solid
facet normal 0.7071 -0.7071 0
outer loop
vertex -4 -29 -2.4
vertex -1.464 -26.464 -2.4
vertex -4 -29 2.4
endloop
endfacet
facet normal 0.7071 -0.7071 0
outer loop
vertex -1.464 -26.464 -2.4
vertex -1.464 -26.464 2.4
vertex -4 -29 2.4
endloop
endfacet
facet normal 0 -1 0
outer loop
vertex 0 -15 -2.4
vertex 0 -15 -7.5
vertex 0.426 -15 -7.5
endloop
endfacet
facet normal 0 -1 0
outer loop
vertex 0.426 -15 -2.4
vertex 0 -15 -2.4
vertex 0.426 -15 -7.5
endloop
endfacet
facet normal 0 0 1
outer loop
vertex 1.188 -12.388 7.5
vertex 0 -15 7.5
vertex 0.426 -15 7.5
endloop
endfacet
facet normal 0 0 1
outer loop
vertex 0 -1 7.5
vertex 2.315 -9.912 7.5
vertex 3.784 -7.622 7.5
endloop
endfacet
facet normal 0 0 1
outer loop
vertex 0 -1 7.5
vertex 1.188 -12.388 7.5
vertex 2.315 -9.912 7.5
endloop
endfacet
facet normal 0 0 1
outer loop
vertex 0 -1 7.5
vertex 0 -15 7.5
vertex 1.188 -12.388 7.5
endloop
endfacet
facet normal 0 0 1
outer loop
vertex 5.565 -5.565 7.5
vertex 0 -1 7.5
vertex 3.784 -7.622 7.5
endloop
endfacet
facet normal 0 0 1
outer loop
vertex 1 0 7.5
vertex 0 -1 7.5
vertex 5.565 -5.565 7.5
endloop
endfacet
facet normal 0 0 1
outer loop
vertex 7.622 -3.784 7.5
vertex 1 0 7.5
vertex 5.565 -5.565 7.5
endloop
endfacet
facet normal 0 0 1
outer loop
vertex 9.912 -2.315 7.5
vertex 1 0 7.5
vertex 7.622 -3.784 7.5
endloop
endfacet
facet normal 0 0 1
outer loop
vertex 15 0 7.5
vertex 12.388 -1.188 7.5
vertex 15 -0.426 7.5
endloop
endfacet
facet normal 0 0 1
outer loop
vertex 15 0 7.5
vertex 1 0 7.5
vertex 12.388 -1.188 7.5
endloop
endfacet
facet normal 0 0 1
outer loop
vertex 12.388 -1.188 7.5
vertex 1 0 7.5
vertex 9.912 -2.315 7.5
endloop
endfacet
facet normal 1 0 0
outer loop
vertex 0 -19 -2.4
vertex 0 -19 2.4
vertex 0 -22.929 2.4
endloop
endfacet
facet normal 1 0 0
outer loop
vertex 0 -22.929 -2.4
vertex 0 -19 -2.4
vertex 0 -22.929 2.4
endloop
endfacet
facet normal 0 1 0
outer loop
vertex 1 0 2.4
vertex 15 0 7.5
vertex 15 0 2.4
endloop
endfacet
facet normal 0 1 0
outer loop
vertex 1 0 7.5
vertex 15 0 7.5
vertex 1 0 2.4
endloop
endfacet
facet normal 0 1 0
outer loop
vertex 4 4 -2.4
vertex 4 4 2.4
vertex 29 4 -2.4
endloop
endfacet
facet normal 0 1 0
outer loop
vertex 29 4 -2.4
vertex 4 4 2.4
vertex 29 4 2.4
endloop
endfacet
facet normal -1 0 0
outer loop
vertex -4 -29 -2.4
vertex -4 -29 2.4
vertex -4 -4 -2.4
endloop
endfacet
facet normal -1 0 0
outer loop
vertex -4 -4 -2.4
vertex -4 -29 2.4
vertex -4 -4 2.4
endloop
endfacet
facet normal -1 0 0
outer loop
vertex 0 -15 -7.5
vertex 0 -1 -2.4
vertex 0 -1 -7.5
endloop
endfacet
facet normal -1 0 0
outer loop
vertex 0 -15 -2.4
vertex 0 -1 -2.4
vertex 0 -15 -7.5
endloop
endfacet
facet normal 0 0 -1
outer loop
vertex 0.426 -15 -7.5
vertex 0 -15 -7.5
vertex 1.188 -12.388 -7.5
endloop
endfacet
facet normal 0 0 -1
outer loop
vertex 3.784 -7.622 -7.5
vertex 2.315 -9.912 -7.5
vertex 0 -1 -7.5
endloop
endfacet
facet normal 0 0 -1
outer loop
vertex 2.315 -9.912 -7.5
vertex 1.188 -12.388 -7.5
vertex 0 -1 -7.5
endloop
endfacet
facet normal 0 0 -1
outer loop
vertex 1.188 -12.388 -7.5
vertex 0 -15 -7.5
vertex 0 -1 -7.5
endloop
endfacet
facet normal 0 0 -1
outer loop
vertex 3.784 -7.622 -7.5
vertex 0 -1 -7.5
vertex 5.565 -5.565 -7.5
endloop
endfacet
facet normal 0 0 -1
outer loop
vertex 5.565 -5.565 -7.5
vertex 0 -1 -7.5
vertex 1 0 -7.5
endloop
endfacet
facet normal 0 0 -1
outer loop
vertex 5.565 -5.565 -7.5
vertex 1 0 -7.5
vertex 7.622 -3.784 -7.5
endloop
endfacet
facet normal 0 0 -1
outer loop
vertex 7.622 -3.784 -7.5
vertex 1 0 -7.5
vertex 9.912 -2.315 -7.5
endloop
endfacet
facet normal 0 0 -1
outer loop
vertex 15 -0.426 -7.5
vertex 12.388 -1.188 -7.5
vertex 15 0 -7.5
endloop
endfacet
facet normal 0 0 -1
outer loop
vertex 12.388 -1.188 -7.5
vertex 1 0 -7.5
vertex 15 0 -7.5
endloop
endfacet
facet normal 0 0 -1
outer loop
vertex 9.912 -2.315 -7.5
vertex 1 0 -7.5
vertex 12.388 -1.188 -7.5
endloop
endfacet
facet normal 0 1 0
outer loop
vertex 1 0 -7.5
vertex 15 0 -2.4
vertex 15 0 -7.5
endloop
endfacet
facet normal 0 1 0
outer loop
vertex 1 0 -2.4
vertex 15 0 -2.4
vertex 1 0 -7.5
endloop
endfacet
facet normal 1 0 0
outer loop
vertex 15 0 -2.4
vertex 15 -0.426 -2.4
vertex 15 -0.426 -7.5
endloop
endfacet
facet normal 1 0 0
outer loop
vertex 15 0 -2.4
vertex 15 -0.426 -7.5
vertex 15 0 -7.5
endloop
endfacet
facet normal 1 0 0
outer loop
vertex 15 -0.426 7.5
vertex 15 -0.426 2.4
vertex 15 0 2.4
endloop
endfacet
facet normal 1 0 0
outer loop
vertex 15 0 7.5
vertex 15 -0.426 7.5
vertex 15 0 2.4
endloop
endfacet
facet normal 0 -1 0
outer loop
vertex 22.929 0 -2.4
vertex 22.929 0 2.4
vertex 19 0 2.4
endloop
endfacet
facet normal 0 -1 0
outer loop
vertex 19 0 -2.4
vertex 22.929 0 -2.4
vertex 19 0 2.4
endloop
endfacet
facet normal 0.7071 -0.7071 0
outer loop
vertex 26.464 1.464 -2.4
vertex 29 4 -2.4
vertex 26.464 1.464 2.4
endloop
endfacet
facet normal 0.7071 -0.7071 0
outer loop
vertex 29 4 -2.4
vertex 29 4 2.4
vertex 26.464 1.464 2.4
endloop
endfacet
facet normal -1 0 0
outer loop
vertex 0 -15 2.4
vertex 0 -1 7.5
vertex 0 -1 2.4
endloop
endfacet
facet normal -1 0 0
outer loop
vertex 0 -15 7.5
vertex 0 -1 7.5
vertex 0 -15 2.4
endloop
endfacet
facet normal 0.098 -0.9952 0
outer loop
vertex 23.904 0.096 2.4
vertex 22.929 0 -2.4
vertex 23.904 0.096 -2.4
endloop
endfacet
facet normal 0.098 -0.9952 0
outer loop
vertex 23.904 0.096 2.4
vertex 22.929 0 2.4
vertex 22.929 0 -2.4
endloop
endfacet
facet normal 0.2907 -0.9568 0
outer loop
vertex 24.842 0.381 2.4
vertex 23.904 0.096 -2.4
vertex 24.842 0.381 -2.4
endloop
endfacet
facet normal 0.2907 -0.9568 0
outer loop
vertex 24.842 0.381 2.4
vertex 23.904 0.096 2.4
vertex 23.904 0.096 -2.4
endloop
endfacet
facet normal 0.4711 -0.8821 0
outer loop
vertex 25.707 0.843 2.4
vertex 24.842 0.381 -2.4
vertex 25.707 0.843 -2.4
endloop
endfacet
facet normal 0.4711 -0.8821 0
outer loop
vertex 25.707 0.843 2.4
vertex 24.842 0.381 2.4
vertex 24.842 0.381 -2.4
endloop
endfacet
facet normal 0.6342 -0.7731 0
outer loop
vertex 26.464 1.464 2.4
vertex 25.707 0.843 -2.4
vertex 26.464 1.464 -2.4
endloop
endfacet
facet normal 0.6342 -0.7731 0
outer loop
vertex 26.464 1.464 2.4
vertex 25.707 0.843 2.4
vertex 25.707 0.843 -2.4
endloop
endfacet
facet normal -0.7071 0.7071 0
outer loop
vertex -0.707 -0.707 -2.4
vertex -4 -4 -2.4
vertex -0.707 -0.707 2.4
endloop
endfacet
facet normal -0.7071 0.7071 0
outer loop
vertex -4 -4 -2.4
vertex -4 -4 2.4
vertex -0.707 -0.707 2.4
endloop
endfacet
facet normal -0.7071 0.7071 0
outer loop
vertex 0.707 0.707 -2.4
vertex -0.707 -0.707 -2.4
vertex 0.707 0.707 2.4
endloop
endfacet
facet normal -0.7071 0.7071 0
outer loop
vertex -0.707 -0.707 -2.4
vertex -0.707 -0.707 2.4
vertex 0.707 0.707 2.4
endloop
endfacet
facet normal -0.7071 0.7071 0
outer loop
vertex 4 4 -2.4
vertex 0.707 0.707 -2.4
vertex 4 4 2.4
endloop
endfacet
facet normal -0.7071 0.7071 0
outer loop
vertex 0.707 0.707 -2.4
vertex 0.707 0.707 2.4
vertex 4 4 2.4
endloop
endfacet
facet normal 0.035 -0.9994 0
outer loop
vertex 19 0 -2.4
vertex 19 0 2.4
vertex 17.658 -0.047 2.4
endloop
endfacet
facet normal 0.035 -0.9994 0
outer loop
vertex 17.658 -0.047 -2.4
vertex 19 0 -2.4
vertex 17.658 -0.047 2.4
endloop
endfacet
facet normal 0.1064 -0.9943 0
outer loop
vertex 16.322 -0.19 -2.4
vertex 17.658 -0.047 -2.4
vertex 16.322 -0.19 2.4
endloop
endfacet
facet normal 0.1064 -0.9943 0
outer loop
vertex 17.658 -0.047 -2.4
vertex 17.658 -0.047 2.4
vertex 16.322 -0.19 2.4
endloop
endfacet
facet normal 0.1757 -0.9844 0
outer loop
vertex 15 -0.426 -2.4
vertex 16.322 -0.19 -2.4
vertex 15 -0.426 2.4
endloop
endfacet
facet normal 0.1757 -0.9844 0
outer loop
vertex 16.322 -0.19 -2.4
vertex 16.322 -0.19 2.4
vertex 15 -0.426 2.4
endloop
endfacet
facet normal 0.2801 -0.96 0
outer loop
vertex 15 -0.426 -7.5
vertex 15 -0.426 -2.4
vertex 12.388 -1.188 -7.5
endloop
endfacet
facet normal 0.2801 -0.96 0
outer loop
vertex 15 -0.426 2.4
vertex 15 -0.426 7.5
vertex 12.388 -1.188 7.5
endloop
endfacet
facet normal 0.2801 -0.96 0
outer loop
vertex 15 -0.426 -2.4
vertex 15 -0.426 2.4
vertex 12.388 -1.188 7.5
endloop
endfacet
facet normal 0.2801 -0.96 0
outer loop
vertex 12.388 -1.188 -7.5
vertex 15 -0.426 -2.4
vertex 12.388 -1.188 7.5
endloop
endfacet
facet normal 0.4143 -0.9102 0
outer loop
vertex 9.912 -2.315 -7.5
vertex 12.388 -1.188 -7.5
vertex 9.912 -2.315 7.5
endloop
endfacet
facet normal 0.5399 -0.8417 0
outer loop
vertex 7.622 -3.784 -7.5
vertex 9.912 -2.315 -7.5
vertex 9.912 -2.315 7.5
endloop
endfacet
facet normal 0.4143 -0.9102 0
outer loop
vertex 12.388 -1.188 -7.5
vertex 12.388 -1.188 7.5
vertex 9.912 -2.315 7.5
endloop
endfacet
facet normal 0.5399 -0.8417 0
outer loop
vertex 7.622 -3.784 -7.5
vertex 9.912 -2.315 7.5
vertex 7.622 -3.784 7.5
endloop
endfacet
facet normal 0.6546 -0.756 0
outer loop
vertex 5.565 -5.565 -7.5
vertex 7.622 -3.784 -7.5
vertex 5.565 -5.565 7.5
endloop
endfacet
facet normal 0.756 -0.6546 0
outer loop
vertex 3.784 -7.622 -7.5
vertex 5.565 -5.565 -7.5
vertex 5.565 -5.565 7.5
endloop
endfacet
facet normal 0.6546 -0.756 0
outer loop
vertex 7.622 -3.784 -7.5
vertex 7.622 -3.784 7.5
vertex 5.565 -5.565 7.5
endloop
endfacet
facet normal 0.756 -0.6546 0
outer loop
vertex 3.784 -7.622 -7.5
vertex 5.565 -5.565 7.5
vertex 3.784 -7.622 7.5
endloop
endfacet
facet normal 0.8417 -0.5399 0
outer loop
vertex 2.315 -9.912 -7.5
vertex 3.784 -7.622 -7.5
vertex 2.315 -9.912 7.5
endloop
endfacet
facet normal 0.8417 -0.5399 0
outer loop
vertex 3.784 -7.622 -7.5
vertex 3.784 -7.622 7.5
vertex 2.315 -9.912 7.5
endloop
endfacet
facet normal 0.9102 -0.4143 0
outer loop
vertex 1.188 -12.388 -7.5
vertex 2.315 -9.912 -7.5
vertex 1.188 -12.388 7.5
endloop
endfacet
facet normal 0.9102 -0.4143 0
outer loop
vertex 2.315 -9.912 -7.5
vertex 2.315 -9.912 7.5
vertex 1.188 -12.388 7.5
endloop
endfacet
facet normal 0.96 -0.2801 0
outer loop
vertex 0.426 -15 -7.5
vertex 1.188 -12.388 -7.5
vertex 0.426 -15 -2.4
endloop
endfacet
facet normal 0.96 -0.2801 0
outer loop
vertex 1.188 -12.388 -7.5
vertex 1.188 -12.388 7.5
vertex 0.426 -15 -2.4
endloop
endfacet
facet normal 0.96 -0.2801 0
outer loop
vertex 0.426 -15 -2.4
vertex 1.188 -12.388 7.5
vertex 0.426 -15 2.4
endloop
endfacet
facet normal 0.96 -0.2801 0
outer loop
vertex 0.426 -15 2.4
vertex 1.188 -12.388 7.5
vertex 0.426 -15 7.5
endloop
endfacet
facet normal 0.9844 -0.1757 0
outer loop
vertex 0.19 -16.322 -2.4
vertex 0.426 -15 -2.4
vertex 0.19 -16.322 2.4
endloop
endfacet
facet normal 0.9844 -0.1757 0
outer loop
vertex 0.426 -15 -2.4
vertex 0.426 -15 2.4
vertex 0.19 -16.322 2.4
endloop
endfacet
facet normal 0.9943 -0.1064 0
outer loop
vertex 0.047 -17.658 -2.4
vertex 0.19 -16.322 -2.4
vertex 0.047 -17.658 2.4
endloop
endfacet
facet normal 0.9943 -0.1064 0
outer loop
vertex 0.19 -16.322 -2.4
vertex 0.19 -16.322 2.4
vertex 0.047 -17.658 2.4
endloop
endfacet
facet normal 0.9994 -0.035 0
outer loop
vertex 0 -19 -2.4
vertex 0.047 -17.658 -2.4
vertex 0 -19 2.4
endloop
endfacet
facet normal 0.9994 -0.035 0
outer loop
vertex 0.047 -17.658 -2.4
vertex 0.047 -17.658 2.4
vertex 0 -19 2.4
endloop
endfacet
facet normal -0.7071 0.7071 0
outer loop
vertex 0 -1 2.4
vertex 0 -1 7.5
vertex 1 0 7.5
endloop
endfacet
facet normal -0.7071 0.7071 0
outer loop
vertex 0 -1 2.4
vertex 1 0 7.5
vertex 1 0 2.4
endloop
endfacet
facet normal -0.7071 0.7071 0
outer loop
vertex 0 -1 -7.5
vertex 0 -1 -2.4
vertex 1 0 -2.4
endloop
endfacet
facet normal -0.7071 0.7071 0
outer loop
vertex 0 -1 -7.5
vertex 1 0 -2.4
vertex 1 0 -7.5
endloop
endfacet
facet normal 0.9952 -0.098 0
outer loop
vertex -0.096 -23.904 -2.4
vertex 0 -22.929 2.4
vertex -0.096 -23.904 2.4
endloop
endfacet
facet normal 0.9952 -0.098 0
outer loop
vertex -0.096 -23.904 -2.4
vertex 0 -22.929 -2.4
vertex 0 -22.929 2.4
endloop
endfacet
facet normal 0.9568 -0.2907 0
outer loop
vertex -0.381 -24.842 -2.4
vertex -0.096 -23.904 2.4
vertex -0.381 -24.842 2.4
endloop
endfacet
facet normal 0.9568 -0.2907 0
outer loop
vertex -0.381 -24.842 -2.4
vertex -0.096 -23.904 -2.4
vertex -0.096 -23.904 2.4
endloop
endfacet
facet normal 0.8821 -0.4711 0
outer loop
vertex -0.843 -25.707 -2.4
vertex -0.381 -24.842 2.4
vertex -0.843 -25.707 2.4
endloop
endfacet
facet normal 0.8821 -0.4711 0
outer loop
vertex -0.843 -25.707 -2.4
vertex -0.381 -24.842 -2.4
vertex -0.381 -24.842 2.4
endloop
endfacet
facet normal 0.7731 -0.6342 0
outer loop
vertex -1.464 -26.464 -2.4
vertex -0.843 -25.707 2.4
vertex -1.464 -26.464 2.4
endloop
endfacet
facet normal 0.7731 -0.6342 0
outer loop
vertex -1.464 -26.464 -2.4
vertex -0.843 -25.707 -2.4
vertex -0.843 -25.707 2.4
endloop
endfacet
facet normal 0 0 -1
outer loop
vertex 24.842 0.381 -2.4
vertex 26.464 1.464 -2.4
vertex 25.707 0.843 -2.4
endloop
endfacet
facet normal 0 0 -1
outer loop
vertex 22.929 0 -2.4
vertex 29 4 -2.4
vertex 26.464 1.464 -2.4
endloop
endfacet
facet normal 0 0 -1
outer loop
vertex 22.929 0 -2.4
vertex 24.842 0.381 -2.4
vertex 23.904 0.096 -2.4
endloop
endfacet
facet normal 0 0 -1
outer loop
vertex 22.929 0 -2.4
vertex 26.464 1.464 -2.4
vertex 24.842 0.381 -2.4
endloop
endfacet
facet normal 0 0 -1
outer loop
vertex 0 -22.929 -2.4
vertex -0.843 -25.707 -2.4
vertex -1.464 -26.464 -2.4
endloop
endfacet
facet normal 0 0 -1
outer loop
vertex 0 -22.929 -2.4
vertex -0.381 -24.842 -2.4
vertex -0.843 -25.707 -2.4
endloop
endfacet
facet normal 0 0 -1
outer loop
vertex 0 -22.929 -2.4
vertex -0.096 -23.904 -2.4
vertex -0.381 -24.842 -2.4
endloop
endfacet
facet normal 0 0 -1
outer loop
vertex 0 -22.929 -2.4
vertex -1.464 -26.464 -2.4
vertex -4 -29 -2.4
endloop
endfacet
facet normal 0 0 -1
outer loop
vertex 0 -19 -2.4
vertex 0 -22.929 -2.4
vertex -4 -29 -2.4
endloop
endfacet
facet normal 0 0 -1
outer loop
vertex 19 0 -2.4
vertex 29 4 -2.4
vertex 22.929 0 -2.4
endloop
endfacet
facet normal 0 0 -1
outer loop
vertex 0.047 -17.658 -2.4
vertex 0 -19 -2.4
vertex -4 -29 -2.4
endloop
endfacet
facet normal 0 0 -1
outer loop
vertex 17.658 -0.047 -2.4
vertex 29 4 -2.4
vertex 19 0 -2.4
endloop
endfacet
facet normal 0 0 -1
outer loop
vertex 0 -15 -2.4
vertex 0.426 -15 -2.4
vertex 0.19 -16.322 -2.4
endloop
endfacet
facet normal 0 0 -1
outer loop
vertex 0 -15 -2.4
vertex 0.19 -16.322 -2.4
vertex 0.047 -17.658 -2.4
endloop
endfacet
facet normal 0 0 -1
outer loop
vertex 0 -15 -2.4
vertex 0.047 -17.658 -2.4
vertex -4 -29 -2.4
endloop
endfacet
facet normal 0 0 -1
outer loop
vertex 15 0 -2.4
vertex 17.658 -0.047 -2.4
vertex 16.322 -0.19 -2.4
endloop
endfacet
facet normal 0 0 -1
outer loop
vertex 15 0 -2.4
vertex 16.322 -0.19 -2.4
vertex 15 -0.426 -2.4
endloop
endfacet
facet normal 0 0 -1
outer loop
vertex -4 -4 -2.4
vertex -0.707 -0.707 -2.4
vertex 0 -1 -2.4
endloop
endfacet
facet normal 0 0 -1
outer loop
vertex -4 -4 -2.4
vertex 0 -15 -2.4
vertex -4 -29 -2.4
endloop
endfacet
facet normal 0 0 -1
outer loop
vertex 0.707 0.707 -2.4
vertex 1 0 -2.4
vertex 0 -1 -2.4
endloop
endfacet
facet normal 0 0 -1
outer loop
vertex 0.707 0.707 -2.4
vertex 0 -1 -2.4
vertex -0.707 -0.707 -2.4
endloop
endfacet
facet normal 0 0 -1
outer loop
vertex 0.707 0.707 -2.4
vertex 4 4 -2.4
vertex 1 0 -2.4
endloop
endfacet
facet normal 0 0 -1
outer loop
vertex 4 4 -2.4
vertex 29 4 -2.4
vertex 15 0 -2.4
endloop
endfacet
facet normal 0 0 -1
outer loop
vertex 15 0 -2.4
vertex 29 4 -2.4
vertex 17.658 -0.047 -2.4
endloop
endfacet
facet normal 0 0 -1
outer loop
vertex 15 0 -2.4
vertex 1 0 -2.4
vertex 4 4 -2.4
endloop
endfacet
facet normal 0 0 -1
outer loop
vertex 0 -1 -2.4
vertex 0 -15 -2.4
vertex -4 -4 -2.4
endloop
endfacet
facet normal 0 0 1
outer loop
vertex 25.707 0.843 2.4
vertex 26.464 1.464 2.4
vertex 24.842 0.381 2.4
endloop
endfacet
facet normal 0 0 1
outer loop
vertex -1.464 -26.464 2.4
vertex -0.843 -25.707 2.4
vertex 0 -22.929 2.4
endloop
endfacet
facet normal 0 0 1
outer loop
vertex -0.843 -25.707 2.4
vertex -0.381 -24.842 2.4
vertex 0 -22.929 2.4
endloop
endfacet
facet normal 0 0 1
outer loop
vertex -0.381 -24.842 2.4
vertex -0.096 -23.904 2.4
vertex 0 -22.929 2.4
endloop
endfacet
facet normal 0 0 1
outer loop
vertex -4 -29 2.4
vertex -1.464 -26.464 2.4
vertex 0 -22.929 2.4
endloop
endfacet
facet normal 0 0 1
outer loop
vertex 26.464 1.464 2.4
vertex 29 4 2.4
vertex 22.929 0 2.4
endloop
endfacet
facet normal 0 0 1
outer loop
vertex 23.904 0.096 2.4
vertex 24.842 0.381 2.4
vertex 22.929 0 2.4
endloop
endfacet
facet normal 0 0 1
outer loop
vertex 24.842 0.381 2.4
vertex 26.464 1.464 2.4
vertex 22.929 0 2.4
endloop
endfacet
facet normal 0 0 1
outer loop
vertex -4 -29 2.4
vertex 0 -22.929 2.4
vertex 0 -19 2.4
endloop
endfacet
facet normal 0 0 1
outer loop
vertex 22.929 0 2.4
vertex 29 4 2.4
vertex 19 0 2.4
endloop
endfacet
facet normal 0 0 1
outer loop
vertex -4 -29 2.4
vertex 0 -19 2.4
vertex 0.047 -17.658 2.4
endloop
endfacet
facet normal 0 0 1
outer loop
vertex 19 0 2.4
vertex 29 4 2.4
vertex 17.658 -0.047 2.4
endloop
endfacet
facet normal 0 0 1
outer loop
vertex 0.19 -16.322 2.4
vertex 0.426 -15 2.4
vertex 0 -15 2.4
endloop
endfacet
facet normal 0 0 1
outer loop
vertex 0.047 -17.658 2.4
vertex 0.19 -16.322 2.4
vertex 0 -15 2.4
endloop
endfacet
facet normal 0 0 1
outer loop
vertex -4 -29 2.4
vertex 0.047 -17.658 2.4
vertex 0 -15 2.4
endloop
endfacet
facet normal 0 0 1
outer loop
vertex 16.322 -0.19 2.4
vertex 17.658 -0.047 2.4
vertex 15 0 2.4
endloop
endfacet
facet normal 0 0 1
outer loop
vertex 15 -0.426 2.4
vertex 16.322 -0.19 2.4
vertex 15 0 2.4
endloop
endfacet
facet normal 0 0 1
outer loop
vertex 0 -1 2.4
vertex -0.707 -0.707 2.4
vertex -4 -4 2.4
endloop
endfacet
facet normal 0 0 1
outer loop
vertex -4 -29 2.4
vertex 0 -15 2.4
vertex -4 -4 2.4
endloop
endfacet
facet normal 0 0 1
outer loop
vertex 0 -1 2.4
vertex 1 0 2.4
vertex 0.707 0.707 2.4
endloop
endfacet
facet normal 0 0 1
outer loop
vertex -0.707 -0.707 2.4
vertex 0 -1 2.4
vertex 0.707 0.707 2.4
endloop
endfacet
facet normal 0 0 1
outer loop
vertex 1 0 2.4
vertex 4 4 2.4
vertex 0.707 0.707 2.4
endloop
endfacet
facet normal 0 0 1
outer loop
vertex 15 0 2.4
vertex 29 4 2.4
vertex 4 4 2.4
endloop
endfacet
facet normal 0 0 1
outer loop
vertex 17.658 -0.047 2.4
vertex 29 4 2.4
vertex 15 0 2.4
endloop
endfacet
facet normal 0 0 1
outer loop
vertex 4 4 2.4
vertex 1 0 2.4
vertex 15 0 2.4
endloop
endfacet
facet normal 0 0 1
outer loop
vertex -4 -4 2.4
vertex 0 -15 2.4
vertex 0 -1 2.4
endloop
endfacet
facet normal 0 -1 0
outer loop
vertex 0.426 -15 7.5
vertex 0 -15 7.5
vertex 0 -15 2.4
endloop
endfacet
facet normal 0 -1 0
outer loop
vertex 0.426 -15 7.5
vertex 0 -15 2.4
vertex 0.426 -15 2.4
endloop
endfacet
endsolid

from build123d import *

# Parameters (mm, degrees)
PAD_DEPTH    = 7.5
PAD001_DEPTH = 2.4
FILLET_R     = 5
POCKET_DEPTH = 103.141808
CHAMFER_SIZE = 1


with BuildPart() as part:
    # Sketch → Pad (new body, symmetric)
    with BuildSketch(Plane.XY):
        with BuildLine():
            Line((0, 0), (0, -19))
            ThreePointArc((19, 0), (5.564971, -5.564971), (0, -19))
            Line((19, 0), (0, 0))
        make_face()
    extrude(amount=PAD_DEPTH, both=True)

    # Sketch001 → Pad001 (join, symmetric)
    with BuildSketch(Plane.XY):
        Polygon((0, 0), (0, -25), (-4, -29), (-4, -4), (4, 4), (29, 4), (25, 0), align=None)
    extrude(amount=PAD001_DEPTH, both=True)

    # Fillet
    fillet_edges = [part.edges().sort_by_distance(p)[0] for p in [
        (0, -25, 0),
        (25, 0, 0),
    ]]
    fillet(fillet_edges, radius=FILLET_R)

    # Sketch002 (on Face8 of Fillet) → Pocket (cut, through all)
    with BuildSketch(Plane.XY.offset(2.4)):
        Polygon((-2, -15), (15, -15), (15, 2), (23, 2), (23, -23), (-2, -23), align=None)
    pocket = extrude(amount=POCKET_DEPTH, mode=Mode.SUBTRACT)

    # Mirrored: Pocket across XY
    add(pocket.mirror(Plane.XY), mode=Mode.SUBTRACT)

    # Chamfer
    chamfer_edges = [part.edges().sort_by_distance(p)[0] for p in [
        (0, 0, 4.95),
        (0, 0, -4.95),
    ]]
    chamfer(chamfer_edges, length=CHAMFER_SIZE)


solid = part.part
